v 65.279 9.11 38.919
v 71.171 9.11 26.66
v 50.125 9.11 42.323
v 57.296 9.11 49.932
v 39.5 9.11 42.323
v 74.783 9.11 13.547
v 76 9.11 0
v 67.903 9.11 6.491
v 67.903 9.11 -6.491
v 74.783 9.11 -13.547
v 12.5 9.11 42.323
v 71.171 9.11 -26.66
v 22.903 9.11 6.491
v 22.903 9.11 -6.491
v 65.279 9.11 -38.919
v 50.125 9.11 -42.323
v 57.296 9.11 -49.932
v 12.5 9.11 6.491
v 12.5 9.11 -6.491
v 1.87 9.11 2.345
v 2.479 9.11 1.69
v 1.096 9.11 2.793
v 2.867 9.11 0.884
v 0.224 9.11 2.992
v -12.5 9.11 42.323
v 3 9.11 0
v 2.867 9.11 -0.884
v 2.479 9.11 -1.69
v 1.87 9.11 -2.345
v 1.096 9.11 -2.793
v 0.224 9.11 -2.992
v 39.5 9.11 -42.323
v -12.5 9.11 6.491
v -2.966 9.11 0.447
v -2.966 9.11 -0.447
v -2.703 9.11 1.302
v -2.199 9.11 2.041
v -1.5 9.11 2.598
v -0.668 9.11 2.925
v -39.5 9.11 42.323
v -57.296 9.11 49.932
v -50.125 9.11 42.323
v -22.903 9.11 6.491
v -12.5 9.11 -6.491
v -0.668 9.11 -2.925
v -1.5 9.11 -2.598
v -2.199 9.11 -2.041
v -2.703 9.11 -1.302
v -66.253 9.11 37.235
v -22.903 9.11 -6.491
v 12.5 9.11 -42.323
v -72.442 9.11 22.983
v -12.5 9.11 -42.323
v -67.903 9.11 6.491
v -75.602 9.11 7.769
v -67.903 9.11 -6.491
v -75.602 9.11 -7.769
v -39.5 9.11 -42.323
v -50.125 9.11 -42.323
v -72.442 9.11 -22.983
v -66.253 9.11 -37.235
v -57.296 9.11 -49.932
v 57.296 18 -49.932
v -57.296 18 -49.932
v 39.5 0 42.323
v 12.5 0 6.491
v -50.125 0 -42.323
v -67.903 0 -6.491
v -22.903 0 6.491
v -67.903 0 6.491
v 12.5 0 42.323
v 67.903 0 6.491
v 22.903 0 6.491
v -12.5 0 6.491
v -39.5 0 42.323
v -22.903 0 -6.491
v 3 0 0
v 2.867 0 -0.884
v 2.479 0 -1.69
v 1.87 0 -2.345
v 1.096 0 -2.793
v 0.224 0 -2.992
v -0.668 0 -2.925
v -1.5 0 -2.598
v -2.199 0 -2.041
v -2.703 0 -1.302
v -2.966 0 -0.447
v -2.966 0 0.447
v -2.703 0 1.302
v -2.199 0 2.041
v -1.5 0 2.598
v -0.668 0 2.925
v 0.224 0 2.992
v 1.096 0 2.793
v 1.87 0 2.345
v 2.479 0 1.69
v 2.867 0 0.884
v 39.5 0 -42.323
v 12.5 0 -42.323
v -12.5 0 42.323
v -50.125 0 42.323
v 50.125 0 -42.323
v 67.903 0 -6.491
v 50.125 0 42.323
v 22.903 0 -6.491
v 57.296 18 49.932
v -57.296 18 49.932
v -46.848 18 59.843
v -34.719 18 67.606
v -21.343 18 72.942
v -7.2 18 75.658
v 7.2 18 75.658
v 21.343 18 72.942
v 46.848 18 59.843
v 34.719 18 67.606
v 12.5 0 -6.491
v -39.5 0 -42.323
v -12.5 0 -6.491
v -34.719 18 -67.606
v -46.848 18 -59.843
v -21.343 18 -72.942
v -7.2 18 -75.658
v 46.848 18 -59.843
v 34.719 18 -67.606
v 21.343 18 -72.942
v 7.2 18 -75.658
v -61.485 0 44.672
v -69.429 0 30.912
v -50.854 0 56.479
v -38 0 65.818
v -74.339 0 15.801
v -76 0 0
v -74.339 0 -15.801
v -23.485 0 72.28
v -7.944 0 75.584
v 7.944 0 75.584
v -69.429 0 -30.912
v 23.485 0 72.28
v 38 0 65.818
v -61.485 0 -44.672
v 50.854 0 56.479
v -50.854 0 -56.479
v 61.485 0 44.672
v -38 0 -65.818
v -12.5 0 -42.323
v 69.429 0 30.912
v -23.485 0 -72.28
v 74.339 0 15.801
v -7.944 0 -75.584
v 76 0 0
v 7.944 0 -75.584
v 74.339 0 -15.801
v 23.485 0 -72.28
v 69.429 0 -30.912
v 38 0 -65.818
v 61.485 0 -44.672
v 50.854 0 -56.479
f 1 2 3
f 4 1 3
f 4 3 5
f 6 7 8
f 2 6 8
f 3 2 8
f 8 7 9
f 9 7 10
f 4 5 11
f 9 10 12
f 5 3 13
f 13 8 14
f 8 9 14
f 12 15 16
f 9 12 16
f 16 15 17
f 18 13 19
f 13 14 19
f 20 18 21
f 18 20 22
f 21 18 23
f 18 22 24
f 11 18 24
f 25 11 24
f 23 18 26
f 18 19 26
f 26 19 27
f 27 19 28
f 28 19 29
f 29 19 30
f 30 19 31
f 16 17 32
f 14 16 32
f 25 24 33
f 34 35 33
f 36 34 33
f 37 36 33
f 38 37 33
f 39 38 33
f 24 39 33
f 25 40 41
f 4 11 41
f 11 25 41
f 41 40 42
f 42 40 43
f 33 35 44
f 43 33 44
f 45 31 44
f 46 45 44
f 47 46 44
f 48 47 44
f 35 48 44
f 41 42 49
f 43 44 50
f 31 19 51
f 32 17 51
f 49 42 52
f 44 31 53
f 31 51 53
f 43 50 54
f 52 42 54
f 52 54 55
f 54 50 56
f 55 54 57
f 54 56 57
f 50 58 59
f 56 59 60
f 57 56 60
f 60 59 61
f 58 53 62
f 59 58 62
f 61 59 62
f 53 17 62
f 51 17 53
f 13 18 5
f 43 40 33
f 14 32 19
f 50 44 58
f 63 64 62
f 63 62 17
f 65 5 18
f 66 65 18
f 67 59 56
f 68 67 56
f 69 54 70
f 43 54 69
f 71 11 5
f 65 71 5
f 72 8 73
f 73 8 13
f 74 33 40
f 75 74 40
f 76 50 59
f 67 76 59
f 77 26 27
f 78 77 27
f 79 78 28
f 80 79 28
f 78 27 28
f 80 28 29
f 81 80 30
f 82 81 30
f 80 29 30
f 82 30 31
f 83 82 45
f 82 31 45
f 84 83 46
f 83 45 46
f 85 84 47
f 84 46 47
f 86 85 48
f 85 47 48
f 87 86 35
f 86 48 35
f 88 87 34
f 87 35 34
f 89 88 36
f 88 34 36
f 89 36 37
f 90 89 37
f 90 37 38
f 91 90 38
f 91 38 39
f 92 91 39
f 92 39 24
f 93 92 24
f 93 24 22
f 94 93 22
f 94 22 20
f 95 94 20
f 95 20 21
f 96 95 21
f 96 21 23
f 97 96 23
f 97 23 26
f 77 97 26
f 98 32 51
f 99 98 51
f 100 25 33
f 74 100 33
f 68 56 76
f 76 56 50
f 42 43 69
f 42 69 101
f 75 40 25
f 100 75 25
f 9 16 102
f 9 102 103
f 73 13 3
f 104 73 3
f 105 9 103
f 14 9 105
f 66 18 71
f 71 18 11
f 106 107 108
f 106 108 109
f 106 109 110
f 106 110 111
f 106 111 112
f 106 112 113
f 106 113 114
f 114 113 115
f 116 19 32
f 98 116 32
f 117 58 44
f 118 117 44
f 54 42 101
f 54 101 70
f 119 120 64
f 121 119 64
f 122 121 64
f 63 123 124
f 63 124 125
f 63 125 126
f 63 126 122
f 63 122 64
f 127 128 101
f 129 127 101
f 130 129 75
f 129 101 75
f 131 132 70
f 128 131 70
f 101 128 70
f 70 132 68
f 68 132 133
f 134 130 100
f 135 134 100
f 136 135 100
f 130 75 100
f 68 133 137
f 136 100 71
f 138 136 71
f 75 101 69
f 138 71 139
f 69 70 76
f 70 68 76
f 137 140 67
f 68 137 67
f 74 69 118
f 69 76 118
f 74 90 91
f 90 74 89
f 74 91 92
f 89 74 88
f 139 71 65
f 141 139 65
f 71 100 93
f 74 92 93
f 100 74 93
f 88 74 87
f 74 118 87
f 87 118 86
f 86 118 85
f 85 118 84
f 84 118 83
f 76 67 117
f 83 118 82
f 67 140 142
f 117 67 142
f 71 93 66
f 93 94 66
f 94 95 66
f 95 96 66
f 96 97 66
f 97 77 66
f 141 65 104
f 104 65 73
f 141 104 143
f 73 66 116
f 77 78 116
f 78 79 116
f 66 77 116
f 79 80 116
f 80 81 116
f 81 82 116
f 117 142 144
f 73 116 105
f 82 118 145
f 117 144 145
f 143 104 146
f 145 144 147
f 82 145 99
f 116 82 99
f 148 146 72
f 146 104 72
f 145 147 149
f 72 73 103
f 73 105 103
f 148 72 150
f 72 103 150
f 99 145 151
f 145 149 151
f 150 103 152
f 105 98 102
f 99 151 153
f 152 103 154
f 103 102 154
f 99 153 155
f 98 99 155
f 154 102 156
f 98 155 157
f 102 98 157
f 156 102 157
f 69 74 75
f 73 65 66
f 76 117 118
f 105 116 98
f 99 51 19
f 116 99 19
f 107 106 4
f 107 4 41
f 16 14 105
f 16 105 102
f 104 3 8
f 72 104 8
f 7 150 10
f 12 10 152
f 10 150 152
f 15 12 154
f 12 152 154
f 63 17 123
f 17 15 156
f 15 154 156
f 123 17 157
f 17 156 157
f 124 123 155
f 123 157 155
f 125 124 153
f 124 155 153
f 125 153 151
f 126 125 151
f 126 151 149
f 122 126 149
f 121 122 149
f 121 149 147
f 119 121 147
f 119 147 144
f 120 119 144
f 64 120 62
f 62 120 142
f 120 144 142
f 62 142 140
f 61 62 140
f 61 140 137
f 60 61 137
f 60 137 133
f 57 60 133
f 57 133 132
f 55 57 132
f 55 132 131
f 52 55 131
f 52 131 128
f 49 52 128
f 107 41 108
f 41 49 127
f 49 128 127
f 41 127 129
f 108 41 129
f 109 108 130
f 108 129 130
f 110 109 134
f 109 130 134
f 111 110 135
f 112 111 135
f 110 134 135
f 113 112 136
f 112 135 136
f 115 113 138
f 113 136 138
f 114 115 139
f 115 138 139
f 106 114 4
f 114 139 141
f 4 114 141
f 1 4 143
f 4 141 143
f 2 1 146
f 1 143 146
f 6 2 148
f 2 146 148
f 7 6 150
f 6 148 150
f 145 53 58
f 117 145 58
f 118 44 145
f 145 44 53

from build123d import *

# Parameters (mm, degrees)
SKETCH1_R           = 76
BOSS_EXTRUDE1_DEPTH = 18
CUT_EXTRUDE4_DEPTH  = 8.89
SKETCH5_R           = 3
CUT_EXTRUDE5_DEPTH  = 20
CUT_EXTRUDE6_DEPTH  = 10.11
CUT_EXTRUDE7_DEPTH  = 10.11


with BuildPart() as part:
    # Sketch1 → Boss-Extrude1 (new body)
    with BuildSketch(Plane(origin=(0, 0, 0), x_dir=(1, 0, 0), z_dir=(0, 1, 0))):
        Circle(SKETCH1_R)
    extrude(amount=BOSS_EXTRUDE1_DEPTH)

    # Sketch2 → Cut-Extrude4 (cut)
    with BuildSketch(Plane(origin=(0, 18, 0), x_dir=(1, 0, 0), z_dir=(0, 1, 0))):
        with BuildLine():
            Line((-58.007955522, 49.931796385), (58.007955522, 49.931796385))
            ThreePointArc((58.007955522, 49.931796385), (107.939751907, 0), (58.007955522, -49.931796385))
            Line((58.007955522, -49.931796385), (-58.007955522, -49.931796385))
            ThreePointArc((-58.007955522, -49.931796385), (-107.939751907, 0), (-58.007955522, 49.931796385))
        make_face()
    extrude(amount=-CUT_EXTRUDE4_DEPTH, mode=Mode.SUBTRACT)

    # Sketch5 → Cut-Extrude5 (cut)
    with BuildSketch(Plane(origin=(0, 9.11, 0), x_dir=(1, 0, 0), z_dir=(0, 1, 0))):
        Circle(SKETCH5_R)
    extrude(amount=-CUT_EXTRUDE5_DEPTH, mode=Mode.SUBTRACT)

    # Sketch7 → Cut-Extrude6 (cut, through all)
    with BuildSketch(Plane(origin=(0, 9.11, 0), x_dir=(1, 0, 0), z_dir=(0, 1, 0))):
        Polygon((-50.125135648, 42.322849323), (-67.902913426, 6.490592664), (-22.902913426, 6.490592664), align=None)
        Polygon((67.902913426, 6.490592664), (22.902913426, 6.490592664), (50.125135648, 42.322849323), align=None)
        Polygon((50.125135648, -42.322849323), (67.902913426, -6.490592664), (22.902913426, -6.490592664), align=None)
        Polygon((-67.902913426, -6.490592664), (-22.902913426, -6.490592664), (-50.125135648, -42.322849323), align=None)
    extrude(amount=-CUT_EXTRUDE6_DEPTH, mode=Mode.SUBTRACT)

    # Sketch9 → Cut-Extrude7 (cut, through all)
    with BuildSketch(Plane(origin=(0, 9.11, 0), x_dir=(1, 0, 0), z_dir=(0, 1, 0))):
        Polygon((-12.5, 6.490592664), (-12.5, 42.322849323), (-39.5, 42.322849323), align=None)
        Polygon((12.5, 6.490592664), (39.5, 42.322849323), (12.5, 42.322849323), align=None)
        Polygon((12.5, -6.490592664), (12.5, -42.322849323), (39.5, -42.322849323), align=None)
        Polygon((-12.5, -6.490592664), (-39.5, -42.322849323), (-12.5, -42.322849323), align=None)
    extrude(amount=-CUT_EXTRUDE7_DEPTH, mode=Mode.SUBTRACT)


solid = part.part
